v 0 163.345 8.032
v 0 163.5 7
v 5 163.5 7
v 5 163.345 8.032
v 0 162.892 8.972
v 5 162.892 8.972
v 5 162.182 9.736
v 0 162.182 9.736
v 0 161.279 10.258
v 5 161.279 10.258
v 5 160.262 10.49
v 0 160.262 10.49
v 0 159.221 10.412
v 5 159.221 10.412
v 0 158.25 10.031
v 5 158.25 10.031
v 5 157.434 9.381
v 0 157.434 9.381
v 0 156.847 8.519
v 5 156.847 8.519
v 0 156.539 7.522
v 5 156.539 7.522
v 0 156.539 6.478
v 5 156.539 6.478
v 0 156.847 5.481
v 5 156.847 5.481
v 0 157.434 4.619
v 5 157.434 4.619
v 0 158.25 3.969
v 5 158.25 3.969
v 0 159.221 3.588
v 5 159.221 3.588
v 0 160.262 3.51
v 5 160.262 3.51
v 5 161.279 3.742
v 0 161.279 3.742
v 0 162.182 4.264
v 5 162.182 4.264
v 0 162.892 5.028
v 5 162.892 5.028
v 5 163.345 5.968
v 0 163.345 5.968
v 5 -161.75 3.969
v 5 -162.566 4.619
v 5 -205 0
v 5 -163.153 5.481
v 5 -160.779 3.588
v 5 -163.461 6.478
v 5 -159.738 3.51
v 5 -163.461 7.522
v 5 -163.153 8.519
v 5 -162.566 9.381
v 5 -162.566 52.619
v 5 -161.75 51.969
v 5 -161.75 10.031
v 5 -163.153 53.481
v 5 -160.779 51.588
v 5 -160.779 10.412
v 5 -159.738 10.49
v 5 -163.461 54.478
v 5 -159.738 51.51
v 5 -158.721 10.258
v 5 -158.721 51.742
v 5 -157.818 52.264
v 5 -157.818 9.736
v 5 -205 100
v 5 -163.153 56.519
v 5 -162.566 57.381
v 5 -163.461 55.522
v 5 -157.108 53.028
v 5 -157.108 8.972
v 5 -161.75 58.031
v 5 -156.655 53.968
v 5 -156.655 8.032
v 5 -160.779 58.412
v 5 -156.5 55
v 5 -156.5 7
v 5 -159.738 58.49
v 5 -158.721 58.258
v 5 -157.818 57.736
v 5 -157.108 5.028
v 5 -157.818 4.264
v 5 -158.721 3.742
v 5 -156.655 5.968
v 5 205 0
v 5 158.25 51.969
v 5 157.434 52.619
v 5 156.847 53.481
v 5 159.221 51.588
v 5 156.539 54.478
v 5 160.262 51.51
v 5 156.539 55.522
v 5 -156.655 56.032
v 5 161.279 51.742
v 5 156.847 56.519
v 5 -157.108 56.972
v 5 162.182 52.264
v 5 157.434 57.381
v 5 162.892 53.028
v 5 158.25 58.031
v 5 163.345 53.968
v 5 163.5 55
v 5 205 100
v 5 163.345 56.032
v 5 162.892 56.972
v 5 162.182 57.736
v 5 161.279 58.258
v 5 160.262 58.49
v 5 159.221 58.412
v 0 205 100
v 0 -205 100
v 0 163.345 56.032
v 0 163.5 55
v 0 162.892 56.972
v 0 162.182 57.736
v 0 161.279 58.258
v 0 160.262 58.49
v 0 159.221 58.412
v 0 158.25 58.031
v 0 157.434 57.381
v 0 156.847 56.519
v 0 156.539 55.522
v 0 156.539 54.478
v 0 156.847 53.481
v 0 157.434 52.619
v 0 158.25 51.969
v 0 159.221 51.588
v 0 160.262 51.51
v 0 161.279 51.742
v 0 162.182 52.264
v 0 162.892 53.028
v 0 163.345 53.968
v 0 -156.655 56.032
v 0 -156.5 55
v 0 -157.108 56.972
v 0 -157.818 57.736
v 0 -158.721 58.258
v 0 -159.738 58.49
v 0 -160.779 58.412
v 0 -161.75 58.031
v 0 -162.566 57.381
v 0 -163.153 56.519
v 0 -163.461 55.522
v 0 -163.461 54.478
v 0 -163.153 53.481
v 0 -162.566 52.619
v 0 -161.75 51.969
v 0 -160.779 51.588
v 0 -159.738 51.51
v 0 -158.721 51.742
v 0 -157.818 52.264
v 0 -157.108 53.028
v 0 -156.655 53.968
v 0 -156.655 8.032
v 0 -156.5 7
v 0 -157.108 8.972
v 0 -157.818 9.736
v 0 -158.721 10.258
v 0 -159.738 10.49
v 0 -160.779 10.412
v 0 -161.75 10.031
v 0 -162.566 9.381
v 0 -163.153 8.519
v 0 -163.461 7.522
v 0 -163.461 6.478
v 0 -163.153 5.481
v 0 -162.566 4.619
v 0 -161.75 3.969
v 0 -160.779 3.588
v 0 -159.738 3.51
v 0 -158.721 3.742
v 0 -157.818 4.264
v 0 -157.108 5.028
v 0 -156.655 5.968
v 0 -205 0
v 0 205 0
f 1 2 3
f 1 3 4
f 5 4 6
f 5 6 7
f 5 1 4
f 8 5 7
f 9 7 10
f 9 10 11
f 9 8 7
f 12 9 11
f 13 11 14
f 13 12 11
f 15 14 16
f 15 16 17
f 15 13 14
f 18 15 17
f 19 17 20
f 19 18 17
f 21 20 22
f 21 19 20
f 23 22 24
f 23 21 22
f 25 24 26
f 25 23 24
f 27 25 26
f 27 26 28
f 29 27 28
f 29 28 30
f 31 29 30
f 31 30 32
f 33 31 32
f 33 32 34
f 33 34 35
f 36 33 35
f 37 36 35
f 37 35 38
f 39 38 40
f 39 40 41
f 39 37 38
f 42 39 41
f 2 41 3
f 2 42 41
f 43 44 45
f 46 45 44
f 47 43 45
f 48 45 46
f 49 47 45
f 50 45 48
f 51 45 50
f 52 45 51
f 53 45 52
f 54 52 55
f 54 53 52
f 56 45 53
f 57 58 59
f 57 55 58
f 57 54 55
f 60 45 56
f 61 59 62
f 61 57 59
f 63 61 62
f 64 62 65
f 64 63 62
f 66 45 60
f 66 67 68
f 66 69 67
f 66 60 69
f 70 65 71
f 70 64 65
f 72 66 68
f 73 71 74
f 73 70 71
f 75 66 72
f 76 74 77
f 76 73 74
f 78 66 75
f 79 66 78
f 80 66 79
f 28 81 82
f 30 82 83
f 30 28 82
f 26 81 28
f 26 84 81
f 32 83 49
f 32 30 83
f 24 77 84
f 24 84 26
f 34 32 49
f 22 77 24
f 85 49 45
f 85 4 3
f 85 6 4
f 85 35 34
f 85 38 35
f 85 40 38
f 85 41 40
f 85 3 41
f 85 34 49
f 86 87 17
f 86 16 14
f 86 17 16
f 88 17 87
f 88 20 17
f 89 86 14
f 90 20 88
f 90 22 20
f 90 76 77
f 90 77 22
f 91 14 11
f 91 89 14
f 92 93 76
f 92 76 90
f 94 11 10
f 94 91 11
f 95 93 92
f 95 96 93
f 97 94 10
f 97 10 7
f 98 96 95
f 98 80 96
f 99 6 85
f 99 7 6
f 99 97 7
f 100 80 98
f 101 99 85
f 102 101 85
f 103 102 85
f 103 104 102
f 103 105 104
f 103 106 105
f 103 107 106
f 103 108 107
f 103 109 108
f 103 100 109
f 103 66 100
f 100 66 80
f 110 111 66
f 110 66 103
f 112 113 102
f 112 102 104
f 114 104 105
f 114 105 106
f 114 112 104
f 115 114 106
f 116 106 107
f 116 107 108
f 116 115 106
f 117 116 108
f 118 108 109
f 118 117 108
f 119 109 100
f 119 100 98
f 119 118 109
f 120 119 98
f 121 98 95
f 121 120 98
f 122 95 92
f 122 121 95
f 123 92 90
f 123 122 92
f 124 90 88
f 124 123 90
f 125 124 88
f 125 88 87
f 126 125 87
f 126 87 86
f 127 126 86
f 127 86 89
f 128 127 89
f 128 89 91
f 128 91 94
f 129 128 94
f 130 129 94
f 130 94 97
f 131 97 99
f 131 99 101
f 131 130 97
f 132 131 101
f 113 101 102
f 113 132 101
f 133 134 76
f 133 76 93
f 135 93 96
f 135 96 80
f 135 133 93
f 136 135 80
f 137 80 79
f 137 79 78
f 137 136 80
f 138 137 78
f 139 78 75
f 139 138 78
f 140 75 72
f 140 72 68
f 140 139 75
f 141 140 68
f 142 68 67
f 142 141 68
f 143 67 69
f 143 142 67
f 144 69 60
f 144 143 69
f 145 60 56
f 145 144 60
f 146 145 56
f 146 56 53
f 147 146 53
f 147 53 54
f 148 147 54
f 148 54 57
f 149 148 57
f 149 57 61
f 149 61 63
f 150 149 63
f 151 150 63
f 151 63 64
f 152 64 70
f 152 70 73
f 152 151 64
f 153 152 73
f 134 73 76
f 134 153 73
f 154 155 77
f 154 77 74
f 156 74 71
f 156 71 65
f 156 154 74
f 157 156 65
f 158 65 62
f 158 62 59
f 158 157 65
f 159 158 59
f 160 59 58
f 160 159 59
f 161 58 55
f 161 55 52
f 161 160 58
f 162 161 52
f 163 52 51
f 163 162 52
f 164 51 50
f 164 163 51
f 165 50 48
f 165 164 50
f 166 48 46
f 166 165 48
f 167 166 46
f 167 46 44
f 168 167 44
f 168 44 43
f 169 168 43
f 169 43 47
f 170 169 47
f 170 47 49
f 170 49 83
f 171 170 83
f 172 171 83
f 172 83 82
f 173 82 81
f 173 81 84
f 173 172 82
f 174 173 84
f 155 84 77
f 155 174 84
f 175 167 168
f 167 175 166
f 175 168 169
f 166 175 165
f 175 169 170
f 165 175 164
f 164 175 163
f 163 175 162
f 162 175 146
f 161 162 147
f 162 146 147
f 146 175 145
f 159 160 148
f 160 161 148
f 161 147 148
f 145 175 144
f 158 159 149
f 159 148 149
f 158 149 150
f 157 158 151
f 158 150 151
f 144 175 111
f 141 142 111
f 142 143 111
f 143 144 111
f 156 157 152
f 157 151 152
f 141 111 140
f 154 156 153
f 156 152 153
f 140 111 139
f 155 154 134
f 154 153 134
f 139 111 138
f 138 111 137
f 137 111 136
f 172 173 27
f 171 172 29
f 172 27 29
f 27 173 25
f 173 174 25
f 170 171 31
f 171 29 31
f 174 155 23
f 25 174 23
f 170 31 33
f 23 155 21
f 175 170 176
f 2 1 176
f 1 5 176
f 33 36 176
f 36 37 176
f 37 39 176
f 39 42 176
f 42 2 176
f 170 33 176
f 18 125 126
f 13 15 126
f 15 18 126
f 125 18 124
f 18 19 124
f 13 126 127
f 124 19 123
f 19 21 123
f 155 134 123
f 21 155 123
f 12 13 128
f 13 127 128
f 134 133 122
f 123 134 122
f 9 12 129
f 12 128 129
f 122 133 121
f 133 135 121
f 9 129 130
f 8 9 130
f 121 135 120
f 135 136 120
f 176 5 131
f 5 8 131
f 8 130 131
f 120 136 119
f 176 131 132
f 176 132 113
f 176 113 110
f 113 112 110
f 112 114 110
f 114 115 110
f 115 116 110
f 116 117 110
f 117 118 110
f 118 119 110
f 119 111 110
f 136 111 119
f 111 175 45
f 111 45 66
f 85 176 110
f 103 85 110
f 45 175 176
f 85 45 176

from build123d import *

# Parameters (mm, degrees)
F0_W     = 410
F0_H     = 100
F0_R     = 3.5
F1_DEPTH = 5


with BuildPart() as f1:
    # F0 (on Right) → F1 (new body)
    with BuildSketch(Plane.YZ):
        with Locations((0, 50)):
            Rectangle(F0_W, F0_H)
        with Locations((-160, 7)):
            Circle(F0_R, mode=Mode.SUBTRACT)
        with Locations((160, 7)):
            Circle(F0_R, mode=Mode.SUBTRACT)
        with Locations((-160, 55)):
            Circle(F0_R, mode=Mode.SUBTRACT)
        with Locations((160, 55)):
            Circle(F0_R, mode=Mode.SUBTRACT)
    extrude(amount=F1_DEPTH)


solid = f1.part
